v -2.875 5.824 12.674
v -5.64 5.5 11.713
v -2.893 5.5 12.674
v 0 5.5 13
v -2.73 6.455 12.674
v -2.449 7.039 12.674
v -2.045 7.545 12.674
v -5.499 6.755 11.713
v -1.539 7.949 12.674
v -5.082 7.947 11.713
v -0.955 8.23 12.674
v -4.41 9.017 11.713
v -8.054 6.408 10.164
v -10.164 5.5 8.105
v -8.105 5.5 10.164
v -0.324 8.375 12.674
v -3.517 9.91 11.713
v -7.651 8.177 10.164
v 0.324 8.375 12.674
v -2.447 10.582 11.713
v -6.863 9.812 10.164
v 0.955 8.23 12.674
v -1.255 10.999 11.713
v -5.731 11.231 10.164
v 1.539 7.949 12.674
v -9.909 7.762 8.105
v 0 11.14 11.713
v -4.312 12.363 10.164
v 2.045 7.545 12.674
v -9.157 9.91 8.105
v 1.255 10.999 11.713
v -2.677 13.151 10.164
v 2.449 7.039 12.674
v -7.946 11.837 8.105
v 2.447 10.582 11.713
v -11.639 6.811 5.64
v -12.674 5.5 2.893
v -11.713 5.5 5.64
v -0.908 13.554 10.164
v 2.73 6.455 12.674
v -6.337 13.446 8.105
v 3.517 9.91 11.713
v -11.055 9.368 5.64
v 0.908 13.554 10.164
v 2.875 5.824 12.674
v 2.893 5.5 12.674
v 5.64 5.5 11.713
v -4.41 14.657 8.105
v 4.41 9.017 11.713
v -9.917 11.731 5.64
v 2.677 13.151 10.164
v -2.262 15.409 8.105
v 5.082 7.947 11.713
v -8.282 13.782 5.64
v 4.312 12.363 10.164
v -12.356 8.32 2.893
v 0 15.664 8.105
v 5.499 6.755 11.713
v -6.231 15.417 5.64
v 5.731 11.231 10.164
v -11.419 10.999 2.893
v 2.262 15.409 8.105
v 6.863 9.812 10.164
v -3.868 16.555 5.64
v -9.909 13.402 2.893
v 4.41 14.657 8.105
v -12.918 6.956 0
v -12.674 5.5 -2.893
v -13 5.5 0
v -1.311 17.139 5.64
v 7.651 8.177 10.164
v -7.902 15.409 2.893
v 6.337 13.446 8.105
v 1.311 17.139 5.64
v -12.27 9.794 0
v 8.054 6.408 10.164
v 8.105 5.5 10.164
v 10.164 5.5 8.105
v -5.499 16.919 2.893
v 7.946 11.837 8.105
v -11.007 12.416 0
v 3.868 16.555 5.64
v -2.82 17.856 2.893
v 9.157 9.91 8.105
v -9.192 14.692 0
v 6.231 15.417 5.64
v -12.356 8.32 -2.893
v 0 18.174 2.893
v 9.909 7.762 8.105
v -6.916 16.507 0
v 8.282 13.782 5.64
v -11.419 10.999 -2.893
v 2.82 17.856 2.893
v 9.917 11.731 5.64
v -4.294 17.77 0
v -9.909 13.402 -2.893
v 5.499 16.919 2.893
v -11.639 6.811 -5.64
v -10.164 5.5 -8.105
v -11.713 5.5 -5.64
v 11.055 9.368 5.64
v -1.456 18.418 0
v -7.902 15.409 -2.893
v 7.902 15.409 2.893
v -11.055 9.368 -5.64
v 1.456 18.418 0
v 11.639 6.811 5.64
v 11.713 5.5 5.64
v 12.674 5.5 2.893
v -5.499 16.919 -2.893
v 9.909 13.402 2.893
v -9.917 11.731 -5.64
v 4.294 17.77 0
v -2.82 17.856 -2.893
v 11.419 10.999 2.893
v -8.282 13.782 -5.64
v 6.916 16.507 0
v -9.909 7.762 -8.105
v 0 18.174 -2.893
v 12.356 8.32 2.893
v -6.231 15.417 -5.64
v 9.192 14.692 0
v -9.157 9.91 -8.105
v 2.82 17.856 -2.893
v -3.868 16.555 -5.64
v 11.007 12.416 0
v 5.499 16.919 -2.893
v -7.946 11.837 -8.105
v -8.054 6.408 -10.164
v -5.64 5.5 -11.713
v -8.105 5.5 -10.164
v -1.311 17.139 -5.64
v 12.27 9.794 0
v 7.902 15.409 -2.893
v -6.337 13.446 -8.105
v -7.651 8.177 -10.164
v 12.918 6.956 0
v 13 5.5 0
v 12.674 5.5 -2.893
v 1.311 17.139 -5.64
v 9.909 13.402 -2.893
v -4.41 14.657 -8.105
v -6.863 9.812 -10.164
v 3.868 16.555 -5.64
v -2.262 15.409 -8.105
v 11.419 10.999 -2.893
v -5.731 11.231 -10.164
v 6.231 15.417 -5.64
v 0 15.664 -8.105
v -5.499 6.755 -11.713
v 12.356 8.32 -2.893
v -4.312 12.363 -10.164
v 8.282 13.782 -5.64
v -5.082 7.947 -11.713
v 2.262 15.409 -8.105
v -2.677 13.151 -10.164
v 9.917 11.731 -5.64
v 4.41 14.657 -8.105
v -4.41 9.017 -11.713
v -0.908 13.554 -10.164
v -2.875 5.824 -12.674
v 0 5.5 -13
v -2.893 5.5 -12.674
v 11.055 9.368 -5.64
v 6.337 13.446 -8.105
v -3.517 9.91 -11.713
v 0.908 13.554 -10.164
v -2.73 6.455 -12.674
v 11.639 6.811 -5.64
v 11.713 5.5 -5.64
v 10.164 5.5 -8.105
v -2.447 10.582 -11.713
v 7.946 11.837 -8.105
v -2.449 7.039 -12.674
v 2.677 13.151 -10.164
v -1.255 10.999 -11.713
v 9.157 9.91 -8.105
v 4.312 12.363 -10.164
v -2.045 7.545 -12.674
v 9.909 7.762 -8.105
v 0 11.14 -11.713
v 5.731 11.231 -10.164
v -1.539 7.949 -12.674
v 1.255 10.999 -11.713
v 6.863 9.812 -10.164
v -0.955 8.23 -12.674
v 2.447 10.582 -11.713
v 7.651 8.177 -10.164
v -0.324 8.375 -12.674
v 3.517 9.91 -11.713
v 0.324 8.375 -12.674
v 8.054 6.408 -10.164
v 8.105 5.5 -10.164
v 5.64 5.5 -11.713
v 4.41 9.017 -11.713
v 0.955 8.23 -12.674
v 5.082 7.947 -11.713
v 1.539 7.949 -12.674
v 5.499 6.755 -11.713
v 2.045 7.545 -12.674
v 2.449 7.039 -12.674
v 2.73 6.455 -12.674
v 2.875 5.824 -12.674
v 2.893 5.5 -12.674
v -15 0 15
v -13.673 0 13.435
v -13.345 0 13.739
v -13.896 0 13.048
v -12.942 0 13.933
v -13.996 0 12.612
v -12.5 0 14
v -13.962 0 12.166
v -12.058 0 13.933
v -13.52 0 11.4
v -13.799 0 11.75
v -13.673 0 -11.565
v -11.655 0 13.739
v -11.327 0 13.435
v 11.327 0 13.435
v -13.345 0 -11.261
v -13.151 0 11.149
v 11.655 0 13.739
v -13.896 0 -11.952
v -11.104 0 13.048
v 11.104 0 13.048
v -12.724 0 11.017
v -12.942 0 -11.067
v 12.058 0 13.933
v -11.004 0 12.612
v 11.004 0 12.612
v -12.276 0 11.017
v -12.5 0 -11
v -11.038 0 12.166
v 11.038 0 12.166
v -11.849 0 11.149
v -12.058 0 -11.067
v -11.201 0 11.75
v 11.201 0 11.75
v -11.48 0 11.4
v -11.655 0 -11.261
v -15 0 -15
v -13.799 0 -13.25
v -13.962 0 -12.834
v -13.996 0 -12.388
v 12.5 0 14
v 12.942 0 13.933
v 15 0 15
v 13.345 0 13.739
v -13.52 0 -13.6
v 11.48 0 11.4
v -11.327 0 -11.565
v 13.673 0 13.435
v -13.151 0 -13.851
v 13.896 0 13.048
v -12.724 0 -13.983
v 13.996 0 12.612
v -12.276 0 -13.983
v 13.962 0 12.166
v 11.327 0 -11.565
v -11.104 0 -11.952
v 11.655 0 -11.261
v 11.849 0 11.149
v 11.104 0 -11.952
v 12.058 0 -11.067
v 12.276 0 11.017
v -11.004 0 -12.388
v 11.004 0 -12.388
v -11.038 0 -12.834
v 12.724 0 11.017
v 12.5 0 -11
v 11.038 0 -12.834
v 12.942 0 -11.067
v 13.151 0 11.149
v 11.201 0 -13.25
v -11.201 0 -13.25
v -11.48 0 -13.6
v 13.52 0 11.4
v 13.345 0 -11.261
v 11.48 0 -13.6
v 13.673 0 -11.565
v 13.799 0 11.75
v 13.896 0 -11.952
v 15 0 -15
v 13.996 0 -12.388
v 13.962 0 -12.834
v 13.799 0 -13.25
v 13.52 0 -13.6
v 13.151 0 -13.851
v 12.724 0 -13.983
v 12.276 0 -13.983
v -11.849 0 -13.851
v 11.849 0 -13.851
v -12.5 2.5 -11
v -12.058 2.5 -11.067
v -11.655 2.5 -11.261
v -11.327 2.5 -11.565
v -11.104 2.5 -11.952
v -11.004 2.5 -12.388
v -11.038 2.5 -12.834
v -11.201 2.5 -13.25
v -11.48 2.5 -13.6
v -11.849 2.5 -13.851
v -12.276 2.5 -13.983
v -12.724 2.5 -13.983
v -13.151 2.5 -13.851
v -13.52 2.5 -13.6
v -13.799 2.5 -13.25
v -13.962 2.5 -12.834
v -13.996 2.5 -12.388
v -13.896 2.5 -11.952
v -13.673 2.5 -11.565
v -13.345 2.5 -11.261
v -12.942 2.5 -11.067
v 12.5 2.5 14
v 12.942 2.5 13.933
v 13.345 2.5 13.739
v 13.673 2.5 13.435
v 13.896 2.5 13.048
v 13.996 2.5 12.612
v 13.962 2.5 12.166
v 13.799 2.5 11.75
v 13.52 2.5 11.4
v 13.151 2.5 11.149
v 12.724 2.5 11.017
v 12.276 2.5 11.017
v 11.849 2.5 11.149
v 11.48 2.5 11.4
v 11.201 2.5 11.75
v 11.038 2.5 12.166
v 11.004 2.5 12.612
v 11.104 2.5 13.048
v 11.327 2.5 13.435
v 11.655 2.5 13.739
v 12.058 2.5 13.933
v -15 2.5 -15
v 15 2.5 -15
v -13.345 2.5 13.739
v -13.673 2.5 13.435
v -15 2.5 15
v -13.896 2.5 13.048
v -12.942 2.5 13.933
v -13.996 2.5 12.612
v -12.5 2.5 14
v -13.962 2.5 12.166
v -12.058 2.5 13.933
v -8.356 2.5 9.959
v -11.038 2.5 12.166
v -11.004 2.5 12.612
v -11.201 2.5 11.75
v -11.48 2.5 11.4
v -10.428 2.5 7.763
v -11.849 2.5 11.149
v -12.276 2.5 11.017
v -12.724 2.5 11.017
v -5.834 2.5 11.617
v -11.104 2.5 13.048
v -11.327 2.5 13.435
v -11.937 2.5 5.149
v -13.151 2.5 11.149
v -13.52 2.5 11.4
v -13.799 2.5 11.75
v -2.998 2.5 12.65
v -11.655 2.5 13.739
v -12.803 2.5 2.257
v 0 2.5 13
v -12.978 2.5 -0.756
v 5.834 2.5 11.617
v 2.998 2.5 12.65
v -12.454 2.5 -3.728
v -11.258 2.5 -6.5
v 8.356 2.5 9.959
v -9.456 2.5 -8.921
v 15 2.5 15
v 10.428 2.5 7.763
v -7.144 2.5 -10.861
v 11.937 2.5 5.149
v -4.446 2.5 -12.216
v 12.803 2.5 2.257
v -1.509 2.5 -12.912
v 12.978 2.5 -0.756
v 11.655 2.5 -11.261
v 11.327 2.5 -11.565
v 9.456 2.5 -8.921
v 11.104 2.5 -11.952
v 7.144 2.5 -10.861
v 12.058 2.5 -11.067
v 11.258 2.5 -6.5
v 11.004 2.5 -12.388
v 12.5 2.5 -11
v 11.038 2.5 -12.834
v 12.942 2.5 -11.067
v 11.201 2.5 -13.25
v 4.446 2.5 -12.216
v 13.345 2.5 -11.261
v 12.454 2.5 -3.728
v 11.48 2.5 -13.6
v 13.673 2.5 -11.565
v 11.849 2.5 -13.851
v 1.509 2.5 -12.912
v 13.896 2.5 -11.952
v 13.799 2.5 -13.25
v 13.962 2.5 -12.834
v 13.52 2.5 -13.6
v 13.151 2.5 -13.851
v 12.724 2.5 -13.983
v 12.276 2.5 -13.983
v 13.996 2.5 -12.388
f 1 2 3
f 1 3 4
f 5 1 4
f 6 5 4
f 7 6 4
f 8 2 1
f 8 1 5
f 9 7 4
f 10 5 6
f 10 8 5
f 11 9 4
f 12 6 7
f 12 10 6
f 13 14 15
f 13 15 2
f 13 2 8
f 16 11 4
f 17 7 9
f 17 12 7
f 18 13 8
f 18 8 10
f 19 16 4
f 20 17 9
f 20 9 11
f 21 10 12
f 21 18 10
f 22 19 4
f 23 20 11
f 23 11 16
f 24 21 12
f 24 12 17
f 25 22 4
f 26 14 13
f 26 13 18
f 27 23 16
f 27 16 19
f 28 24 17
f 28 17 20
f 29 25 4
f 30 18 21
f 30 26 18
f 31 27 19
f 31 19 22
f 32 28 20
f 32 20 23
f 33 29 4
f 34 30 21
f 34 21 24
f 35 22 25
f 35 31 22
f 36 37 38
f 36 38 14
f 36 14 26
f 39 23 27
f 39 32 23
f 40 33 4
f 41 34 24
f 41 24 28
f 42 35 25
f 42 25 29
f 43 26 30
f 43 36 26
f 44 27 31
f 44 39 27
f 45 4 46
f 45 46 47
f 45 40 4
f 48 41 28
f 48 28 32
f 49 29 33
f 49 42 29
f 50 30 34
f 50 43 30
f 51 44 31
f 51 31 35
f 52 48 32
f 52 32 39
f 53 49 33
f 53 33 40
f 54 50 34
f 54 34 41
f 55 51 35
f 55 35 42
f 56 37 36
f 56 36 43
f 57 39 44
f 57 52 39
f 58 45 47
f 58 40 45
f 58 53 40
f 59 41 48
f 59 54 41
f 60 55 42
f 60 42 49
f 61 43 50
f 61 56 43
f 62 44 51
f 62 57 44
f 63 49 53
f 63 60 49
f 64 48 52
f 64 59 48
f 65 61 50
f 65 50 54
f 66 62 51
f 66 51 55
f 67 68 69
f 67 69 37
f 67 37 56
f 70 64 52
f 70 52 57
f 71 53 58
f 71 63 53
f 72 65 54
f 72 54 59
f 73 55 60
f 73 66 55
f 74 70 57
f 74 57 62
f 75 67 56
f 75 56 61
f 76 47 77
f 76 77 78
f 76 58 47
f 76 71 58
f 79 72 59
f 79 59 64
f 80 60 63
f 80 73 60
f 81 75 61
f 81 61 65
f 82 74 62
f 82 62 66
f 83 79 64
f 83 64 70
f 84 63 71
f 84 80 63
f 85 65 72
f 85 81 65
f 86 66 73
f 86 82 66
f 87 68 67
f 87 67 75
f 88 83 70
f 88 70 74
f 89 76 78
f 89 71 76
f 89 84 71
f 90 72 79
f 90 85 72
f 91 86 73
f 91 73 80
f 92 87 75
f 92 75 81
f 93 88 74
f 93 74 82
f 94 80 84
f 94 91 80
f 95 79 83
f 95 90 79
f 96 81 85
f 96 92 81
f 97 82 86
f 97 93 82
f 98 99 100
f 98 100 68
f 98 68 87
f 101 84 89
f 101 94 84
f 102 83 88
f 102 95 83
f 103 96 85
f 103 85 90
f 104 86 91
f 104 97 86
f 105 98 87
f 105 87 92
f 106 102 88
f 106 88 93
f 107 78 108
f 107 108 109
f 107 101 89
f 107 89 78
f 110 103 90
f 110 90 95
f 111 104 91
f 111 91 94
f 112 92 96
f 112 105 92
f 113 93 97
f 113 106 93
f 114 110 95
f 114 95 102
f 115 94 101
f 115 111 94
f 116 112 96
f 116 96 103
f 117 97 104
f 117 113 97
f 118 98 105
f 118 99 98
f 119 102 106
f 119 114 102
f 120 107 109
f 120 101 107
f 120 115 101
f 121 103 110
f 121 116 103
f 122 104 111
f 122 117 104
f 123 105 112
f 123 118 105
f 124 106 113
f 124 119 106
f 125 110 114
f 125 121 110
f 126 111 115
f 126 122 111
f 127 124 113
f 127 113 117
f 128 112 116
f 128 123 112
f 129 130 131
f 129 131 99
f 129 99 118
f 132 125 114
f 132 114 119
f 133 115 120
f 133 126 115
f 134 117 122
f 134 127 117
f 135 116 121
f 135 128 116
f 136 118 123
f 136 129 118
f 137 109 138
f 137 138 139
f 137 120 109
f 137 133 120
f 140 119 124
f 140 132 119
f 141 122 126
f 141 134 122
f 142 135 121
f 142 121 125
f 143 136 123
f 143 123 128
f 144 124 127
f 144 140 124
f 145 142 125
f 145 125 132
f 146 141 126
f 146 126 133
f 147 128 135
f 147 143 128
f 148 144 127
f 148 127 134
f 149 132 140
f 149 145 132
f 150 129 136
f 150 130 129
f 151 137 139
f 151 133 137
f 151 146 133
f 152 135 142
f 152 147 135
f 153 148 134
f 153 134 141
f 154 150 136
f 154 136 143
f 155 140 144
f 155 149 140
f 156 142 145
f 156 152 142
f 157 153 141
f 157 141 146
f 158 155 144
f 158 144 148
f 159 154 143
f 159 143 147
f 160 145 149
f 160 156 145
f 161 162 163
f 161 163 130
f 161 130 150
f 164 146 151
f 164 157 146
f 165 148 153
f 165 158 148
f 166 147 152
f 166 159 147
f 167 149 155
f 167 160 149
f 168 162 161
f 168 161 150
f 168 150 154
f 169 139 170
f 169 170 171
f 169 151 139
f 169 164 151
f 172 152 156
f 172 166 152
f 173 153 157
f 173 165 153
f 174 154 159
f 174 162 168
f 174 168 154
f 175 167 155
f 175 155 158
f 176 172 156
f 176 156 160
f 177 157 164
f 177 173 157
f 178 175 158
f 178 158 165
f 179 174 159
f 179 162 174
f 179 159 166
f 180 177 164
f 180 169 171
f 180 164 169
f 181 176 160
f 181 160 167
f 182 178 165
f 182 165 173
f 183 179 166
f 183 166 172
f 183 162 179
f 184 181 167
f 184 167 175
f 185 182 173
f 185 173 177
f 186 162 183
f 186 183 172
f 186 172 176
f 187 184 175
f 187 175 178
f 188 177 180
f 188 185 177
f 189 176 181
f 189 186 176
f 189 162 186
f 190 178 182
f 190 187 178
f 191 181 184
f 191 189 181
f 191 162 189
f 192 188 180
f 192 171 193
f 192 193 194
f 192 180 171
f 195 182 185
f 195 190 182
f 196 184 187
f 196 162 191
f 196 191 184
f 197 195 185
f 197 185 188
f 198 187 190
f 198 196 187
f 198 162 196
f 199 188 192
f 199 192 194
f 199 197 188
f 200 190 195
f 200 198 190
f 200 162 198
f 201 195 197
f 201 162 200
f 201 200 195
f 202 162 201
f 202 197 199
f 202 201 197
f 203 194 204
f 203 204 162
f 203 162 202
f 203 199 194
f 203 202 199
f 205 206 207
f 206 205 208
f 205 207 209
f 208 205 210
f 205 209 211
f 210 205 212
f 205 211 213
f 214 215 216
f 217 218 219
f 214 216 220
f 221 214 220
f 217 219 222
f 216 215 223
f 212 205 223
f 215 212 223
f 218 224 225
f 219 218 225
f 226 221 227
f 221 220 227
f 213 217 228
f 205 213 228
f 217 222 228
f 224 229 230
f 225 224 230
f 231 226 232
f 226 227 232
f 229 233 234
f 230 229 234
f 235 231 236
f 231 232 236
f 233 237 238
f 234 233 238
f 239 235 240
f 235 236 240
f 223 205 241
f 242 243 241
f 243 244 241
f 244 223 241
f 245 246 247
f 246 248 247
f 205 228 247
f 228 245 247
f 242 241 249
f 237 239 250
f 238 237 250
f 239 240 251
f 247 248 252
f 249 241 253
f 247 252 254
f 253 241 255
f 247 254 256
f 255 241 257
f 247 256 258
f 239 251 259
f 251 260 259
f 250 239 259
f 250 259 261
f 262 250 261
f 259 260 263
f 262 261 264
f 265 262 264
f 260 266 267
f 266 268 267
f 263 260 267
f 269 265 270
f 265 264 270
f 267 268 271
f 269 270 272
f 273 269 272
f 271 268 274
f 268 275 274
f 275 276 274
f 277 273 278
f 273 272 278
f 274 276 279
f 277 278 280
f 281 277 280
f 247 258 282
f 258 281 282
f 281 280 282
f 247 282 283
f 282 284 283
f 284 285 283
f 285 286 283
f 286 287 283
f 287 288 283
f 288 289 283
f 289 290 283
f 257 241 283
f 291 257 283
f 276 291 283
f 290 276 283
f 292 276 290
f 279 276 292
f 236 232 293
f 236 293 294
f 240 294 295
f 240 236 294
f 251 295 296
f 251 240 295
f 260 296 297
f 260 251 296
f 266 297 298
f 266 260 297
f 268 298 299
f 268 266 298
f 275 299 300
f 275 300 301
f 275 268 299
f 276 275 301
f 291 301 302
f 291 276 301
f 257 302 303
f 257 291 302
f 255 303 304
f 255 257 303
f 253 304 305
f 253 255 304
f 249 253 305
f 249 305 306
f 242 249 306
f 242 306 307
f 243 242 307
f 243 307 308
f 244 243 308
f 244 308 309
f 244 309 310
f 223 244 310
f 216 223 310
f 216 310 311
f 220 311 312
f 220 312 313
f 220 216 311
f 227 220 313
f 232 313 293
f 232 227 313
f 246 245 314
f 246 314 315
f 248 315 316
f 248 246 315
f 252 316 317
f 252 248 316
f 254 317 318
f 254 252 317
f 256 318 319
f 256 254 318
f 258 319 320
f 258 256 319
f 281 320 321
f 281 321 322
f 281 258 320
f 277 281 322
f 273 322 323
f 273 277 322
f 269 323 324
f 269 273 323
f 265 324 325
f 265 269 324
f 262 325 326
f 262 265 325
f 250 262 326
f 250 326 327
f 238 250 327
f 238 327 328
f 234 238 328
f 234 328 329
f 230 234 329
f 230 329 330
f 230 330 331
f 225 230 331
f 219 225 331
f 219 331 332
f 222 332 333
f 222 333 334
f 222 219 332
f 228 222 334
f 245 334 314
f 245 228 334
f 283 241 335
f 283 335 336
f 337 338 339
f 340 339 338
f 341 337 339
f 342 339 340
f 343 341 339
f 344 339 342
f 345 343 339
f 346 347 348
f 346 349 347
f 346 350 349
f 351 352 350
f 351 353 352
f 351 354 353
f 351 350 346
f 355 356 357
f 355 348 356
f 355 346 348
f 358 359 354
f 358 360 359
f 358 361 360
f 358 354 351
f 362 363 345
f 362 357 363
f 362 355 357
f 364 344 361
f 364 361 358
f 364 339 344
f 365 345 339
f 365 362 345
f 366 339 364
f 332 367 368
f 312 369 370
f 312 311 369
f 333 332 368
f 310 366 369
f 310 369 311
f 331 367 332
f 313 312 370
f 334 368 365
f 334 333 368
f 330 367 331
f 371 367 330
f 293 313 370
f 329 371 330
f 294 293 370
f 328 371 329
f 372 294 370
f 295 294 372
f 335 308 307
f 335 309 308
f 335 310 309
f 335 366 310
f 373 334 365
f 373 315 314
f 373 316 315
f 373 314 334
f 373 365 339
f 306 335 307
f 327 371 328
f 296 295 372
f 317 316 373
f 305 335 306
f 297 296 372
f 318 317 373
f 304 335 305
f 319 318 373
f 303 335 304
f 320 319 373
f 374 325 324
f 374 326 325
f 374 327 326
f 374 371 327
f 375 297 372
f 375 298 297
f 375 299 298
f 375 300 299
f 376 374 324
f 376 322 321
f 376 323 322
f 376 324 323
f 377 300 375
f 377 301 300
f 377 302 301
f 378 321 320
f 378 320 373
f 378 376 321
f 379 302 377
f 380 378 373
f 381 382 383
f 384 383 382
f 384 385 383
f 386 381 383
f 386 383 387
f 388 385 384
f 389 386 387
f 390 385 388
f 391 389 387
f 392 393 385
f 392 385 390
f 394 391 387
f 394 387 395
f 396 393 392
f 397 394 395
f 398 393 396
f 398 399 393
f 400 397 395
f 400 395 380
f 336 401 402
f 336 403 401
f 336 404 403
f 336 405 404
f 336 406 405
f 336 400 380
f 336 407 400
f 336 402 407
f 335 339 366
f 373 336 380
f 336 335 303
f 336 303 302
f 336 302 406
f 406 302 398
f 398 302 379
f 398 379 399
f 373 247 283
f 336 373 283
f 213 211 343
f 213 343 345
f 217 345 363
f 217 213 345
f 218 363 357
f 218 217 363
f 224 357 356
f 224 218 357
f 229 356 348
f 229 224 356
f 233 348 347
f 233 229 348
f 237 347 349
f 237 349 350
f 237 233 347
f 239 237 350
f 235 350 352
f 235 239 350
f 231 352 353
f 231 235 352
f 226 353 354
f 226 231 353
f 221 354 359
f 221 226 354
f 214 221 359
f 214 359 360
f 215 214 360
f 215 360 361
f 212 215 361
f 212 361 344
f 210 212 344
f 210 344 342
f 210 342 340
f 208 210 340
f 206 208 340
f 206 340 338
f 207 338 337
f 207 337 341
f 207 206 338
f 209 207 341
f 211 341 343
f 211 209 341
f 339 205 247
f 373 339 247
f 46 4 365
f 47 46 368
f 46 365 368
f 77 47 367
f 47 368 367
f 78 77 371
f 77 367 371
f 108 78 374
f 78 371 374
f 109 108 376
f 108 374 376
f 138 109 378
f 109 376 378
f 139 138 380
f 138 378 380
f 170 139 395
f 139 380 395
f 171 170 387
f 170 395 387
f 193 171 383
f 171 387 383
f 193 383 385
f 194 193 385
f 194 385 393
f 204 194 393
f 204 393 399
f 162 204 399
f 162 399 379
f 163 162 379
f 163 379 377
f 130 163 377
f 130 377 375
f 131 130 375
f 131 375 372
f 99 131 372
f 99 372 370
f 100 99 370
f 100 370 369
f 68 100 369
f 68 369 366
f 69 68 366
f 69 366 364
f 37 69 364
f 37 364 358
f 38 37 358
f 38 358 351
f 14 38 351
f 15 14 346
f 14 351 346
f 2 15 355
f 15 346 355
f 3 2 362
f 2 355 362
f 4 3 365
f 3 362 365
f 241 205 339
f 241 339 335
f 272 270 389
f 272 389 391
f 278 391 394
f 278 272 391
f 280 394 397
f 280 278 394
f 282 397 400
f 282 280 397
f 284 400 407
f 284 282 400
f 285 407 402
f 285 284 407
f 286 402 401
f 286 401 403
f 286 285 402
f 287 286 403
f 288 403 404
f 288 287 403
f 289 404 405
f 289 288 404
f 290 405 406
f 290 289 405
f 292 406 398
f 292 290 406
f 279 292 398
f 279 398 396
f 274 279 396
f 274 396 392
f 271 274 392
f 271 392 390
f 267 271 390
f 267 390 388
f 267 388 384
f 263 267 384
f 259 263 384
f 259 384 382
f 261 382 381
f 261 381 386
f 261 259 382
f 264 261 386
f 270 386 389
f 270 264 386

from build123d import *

# Parameters (mm, degrees)
SKETCH_1_W      = 30
SKETCH_1_H      = 30
SKETCH_1_R      = 1.5
EXTRUDE_1_DEPTH = 2.5
SKETCH_2_R      = 13
EXTRUDE_2_DEPTH = 3
REVOLVE_1_ANGLE = 180


with BuildPart() as part:
    # Эскиз1 → Бобышка-Вытянуть1 (new body)
    with BuildSketch(Plane(origin=(0, 0, 0), x_dir=(1, 0, 0), z_dir=(0, 1, 0))):
        Rectangle(SKETCH_1_W, SKETCH_1_H)
        with Locations(Location((-12.5, 12.5, 0), (0, 0, 270))):
            Circle(SKETCH_1_R, mode=Mode.SUBTRACT)
        with Locations(Location((12.5, 12.5, 0), (0, 0, 270))):
            Circle(SKETCH_1_R, mode=Mode.SUBTRACT)
        with Locations(Location((-12.5, -12.5, 0), (0, 0, 270))):
            Circle(SKETCH_1_R, mode=Mode.SUBTRACT)
        with Locations(Location((12.5, -12.5, 0), (0, 0, 270))):
            Circle(SKETCH_1_R, mode=Mode.SUBTRACT)
    extrude(amount=EXTRUDE_1_DEPTH)

    # Эскиз2 → Бобышка-Вытянуть2 (add)
    with BuildSketch(Plane(origin=(0, 2.5, 0), x_dir=(1, 0, 0), z_dir=(0, 1, 0))):
        with Locations(Location((0, 0, 0), (0, 0, 270))):
            Circle(SKETCH_2_R)
    extrude(amount=EXTRUDE_2_DEPTH)

    # Эскиз3 → Повернуть1 (revolve)
    with BuildSketch(Plane(origin=(0, 5.5, 0), x_dir=(1, 0, 0), z_dir=(0, 1, 0))):
        with BuildLine():
            Line((0, 13), (0, -13))
            ThreePointArc((0, -13), (-13, 0), (0, 13))
        make_face()
    revolve(axis=Axis((0, 5.5, -13), (0, 0, -1)), revolution_arc=REVOLVE_1_ANGLE)


solid = part.part
